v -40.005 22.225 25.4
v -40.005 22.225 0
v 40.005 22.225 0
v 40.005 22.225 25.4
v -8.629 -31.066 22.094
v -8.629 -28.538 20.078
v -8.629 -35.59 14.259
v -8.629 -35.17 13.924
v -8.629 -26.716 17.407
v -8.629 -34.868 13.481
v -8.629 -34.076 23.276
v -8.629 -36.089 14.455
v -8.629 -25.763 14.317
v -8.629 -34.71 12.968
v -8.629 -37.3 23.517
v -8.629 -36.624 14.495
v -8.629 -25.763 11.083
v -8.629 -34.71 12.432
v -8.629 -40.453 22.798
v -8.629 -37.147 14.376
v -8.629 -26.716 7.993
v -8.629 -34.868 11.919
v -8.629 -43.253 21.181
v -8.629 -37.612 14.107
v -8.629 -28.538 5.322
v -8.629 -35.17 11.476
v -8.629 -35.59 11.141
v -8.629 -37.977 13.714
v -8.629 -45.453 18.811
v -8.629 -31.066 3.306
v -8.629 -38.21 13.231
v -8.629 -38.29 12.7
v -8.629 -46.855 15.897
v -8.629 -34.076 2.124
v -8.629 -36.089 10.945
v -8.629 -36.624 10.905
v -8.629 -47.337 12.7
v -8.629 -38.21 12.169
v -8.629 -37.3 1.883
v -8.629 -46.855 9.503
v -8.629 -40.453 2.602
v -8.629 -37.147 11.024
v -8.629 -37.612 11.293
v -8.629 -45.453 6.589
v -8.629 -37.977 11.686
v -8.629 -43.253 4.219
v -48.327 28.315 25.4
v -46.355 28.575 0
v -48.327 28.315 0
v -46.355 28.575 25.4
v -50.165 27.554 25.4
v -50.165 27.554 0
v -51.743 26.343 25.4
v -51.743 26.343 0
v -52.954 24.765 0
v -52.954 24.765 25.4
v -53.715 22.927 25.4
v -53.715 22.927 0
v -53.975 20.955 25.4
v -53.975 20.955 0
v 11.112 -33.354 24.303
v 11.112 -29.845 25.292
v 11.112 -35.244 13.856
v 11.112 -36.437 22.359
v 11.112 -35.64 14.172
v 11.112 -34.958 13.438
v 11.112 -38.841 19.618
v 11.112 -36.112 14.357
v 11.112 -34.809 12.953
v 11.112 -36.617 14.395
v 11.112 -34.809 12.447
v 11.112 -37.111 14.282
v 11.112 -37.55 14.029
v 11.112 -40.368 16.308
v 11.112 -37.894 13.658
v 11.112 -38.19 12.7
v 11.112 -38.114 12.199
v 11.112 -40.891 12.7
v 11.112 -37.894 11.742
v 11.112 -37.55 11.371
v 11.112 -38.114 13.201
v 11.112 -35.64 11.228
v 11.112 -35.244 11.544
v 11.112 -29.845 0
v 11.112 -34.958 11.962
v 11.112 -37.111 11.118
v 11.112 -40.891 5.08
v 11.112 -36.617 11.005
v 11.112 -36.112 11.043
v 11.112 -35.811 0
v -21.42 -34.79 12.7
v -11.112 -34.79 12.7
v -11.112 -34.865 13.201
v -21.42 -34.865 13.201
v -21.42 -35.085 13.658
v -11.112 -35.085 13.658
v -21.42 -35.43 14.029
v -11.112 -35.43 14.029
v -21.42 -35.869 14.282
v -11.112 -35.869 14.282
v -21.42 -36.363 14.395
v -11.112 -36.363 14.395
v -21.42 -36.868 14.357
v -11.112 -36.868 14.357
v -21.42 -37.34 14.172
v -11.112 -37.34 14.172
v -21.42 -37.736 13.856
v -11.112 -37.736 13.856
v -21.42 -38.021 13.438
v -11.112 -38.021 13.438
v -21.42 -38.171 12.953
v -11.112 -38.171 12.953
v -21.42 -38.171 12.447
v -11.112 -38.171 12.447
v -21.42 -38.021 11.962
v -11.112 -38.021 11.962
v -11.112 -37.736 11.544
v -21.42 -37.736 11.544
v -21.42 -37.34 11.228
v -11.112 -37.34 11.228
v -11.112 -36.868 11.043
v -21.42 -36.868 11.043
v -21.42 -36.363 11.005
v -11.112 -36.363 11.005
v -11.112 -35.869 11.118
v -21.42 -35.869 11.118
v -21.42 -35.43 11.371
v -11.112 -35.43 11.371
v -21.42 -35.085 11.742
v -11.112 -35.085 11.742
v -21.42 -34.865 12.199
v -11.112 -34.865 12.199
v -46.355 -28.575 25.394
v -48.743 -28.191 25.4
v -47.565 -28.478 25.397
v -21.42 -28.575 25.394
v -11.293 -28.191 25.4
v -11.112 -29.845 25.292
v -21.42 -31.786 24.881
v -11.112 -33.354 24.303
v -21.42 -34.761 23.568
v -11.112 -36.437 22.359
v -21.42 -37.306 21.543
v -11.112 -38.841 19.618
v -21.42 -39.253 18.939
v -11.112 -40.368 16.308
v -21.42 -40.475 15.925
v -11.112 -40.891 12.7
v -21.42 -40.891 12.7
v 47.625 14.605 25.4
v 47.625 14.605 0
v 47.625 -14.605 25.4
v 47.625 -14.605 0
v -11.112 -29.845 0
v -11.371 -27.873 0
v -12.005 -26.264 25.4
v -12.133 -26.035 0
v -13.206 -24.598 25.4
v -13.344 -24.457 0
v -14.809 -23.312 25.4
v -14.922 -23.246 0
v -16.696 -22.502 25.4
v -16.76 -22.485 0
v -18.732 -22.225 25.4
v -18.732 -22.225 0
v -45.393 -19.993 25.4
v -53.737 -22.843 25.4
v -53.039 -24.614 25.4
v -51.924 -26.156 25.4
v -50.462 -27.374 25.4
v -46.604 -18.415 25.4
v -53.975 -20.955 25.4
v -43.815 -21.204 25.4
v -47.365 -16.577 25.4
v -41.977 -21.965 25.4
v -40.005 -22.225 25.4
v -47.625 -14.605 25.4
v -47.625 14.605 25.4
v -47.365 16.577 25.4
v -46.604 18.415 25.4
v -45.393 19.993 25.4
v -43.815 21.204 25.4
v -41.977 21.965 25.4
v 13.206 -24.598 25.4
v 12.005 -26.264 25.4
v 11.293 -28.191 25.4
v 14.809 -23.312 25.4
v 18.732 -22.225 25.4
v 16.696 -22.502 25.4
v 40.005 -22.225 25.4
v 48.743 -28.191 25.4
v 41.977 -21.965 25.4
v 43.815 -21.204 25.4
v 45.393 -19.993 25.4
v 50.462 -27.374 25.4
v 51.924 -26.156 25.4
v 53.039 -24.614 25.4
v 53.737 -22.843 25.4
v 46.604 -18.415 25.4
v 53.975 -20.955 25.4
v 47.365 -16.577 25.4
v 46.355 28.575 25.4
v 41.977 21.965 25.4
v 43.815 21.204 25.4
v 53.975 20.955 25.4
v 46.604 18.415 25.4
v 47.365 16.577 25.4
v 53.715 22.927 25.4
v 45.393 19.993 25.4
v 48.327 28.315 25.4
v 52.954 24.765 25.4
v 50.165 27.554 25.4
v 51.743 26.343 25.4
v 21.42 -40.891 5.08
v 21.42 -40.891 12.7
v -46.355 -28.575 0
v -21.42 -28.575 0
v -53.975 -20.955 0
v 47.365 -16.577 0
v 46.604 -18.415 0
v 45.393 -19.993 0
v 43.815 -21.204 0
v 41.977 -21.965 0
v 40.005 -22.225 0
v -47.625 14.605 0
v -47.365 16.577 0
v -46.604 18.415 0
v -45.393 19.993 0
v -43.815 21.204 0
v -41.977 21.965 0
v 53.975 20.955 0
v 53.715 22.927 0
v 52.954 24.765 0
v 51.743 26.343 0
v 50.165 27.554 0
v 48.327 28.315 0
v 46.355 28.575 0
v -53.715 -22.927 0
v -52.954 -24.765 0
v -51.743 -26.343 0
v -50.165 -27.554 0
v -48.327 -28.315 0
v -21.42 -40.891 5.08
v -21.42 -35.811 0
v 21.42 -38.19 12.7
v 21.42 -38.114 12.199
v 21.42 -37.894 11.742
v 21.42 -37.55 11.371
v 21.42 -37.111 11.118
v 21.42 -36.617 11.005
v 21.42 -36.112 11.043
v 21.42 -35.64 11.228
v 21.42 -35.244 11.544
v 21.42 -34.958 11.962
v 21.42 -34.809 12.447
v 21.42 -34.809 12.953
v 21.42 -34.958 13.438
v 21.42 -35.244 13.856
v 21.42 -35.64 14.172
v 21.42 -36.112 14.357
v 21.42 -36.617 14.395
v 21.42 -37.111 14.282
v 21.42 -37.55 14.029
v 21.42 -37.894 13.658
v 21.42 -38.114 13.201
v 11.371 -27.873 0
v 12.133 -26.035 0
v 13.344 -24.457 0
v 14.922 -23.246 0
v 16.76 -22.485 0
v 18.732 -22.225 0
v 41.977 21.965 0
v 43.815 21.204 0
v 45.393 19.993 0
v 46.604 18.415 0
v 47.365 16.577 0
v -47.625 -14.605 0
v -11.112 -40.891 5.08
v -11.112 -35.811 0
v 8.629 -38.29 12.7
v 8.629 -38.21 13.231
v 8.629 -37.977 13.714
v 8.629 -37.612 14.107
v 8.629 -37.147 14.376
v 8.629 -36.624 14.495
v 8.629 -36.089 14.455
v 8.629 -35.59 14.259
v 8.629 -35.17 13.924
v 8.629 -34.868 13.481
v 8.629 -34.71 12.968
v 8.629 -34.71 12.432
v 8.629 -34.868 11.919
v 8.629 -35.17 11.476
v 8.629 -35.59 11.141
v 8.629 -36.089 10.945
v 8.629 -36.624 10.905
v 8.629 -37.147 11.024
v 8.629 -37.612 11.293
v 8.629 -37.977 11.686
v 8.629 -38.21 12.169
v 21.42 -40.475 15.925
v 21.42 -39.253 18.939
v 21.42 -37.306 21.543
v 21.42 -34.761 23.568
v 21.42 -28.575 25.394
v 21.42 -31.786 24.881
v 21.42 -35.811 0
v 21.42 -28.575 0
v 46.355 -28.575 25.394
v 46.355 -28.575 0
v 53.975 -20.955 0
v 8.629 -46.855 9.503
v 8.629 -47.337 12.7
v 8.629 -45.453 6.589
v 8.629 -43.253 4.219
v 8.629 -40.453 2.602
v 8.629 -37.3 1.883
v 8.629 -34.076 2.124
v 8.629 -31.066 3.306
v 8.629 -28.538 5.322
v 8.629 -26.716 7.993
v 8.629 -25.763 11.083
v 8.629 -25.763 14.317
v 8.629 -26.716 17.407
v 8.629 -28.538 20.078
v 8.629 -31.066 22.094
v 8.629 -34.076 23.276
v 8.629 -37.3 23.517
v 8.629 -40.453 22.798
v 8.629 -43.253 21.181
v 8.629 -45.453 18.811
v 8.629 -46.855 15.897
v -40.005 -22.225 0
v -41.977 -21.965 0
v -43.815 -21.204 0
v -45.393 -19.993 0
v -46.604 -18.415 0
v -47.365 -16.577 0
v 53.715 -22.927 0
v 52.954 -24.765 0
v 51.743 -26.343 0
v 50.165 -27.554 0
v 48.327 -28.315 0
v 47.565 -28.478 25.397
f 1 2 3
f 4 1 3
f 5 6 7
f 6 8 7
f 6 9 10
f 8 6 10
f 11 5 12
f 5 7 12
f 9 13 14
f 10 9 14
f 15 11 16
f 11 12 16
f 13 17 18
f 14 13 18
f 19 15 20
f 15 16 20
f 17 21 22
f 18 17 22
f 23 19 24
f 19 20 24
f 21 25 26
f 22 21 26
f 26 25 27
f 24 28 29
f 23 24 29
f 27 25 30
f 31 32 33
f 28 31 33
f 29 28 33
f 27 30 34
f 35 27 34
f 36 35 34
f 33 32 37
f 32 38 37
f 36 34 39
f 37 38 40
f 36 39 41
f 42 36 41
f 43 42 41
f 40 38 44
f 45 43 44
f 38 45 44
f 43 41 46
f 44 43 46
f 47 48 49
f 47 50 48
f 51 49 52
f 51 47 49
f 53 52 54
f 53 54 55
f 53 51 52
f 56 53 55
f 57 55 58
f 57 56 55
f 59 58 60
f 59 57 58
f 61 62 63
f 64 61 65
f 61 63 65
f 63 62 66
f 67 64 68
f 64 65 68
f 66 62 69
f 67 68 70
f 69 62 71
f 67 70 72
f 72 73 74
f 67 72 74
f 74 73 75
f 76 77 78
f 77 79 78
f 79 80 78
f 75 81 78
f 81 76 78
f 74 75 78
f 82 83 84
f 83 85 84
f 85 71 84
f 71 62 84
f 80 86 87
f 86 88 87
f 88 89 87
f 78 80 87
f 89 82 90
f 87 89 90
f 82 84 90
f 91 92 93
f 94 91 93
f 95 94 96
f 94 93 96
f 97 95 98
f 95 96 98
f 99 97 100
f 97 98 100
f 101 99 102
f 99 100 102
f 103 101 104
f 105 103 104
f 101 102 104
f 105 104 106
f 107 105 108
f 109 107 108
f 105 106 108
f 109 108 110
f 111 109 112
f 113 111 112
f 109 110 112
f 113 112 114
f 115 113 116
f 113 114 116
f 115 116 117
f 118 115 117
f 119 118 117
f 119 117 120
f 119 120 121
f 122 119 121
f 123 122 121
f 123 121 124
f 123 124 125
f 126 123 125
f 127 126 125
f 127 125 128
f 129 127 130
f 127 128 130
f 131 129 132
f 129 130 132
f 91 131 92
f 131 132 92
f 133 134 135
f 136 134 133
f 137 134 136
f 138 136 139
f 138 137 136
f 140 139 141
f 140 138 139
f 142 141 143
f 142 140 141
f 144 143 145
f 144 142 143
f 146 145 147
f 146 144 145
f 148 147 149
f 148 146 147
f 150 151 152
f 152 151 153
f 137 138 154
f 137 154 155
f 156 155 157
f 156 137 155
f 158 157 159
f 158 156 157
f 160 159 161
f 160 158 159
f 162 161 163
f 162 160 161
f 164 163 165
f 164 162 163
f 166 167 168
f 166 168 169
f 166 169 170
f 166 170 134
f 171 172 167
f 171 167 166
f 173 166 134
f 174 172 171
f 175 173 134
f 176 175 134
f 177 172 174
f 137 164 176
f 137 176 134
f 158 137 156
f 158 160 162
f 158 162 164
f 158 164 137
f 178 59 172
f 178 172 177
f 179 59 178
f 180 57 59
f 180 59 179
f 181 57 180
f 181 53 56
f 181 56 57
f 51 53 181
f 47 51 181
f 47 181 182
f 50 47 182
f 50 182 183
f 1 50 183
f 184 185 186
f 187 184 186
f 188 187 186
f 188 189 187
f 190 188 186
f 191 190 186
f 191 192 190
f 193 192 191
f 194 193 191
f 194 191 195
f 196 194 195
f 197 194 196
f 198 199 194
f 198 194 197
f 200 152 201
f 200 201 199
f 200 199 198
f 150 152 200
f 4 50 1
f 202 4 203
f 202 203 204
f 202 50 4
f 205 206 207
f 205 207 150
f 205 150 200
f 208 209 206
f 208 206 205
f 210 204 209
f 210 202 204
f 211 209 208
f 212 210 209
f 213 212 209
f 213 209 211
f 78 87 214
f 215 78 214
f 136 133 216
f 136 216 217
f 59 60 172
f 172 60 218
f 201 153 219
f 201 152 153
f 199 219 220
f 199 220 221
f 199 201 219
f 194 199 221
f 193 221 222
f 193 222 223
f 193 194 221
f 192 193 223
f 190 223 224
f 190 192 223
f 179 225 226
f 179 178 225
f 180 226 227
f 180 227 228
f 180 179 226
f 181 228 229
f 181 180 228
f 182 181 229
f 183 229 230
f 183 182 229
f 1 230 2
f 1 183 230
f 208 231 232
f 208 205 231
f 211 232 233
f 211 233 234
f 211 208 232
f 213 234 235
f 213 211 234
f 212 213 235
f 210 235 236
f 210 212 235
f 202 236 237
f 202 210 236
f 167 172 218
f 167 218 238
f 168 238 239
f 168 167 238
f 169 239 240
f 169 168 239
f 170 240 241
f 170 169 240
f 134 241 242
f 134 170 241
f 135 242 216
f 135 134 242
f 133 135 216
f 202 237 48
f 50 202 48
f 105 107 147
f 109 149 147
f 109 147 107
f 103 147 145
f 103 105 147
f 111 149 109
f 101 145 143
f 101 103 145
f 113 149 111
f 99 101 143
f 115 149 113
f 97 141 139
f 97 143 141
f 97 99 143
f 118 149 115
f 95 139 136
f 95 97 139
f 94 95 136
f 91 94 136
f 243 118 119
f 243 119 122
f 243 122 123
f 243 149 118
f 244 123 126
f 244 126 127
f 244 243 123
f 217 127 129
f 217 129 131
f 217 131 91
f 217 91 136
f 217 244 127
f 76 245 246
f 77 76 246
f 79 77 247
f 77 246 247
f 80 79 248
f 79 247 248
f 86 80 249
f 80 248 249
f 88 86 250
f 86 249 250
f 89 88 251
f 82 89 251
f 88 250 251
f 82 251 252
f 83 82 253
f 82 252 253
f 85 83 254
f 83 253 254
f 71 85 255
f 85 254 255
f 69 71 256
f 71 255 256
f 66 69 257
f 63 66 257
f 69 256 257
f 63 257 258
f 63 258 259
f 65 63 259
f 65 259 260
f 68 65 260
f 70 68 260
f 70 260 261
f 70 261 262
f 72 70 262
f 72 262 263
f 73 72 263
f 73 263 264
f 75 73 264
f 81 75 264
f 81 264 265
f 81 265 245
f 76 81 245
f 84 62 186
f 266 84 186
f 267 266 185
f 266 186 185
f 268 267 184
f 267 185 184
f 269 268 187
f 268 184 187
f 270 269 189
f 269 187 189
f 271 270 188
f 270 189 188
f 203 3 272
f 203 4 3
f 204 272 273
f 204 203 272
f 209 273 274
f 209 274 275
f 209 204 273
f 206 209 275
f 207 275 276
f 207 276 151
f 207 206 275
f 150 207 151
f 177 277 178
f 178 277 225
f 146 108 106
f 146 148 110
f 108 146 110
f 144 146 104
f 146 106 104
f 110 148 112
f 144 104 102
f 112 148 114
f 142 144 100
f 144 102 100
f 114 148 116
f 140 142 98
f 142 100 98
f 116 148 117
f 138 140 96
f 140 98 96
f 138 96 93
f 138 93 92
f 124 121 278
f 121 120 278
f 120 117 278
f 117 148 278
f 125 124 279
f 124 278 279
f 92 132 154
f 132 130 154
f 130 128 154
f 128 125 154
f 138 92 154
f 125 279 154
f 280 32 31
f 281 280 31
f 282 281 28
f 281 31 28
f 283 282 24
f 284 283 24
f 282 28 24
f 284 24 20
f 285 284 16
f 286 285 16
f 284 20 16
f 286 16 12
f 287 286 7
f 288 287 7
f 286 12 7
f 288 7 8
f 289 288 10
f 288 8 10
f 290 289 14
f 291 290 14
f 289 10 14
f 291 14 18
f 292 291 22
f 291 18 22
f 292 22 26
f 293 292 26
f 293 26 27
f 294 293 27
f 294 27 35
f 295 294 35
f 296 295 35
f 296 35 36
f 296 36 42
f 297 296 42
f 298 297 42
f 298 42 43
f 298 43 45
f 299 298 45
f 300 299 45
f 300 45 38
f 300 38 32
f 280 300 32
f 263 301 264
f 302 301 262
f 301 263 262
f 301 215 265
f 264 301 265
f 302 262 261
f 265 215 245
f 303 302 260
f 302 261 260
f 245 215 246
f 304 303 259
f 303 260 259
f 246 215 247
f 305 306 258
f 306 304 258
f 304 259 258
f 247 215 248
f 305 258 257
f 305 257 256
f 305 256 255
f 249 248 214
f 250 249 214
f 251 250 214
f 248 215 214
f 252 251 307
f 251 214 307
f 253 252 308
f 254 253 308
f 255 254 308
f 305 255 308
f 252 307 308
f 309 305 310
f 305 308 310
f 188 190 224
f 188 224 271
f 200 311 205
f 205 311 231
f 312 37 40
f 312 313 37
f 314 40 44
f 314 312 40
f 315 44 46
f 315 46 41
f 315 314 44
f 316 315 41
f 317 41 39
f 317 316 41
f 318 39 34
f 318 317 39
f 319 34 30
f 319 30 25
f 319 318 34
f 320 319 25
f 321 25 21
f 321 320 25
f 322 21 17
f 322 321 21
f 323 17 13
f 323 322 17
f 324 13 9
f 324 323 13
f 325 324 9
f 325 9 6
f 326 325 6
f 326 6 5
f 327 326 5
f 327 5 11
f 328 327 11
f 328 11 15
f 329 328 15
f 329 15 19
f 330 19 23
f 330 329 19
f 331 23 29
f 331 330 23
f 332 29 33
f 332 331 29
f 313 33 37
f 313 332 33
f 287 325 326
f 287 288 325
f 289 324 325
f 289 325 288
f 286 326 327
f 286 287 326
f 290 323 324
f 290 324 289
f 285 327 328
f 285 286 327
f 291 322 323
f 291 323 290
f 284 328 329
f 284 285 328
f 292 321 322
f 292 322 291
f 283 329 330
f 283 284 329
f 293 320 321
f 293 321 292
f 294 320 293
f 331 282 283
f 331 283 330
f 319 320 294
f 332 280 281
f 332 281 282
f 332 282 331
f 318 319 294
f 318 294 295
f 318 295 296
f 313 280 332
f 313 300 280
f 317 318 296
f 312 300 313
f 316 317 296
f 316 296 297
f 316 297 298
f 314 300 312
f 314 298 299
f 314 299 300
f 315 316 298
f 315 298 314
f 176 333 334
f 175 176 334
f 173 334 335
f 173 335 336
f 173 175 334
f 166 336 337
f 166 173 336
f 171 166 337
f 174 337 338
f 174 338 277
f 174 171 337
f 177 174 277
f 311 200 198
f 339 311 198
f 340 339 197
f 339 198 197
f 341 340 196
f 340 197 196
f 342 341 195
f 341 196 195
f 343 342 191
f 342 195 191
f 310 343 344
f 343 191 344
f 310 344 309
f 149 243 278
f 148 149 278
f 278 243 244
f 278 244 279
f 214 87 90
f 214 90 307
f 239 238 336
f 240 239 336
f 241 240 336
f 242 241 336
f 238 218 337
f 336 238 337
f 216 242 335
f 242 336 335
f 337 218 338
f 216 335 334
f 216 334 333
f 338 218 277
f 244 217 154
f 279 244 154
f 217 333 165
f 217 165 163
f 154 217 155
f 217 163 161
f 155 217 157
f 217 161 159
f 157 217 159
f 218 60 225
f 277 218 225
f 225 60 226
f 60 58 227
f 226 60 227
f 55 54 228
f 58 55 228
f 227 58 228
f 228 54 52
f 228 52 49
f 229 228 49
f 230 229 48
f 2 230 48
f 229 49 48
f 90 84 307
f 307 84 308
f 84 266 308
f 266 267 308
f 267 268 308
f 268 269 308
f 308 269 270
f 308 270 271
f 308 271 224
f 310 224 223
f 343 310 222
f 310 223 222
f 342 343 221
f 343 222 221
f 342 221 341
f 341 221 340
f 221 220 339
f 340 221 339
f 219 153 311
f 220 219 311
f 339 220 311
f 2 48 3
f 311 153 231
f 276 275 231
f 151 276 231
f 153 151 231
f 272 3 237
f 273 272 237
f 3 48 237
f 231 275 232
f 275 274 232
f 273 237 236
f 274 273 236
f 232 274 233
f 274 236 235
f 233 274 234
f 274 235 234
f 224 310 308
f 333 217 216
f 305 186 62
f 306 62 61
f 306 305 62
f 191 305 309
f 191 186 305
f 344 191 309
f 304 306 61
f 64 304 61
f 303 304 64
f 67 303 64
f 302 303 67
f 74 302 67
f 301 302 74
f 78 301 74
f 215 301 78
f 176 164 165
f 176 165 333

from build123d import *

# Parameters (mm, degrees)
F0_W     = 10.3086968884
F0_H     = 12.3161332488
F1_DEPTH = 25.4
F0_W_2   = 17.2582492232
F0_H_2   = 10.8475995182
F5_D     = 3.6
F6_D     = 3.4
F6_DEPTH = 62.6051246116
F7_D     = 3.4
F8_R     = 12.7
F9_R     = 7.62
F10_SIZE = 5.08


with BuildPart() as f1:
    # F0 (on Top) → F1 (new body)
    with BuildSketch(Plane.XY):
        Polygon((21.42043598, -28.575), (53.975, -28.575), (53.975, 28.575), (-53.975, 28.575), (-53.975, -28.575), (-21.42043598, -28.575), (-11.1117390916, -28.575), (-11.1117390916, -22.225), (-47.625, -22.225), (-47.625, 22.225), (47.625, 22.225), (47.625, -22.225), (11.1117390916, -22.225), (11.1117390916, -28.575), align=None)
        with Locations((-16.2660875358, -34.7330666244)):
            Rectangle(F0_W, F0_H)
        with Locations((16.2660875358, -34.7330666244)):
            Rectangle(F0_W, F0_H)
    extrude(amount=F1_DEPTH)

    # F6 (through all, one way)
    with BuildSketch(Plane.YZ.offset(8.6291246116)):
        with Locations((-36.4898145199, 12.7)):
            Circle(F6_D / 2)
    extrude(amount=-F6_DEPTH, mode=Mode.SUBTRACT)

    # F7 (through all)
    with Locations(Plane(origin=(8.6291246116, 0, 0), x_dir=(0, 1, 0), z_dir=(-1, 0, 0))):
        with Locations((-36.4898145199, -12.7)):
            Hole(F7_D / 2)

    # F8
    f8_edges = [f1.edges().sort_by_distance(p)[0] for p in [
        (16.266088, -40.891133, 25.4),
        (-16.266088, -40.891133, 25.4),
    ]]
    fillet(f8_edges, radius=F8_R)

    # F9
    f9_edges = [f1.edges().sort_by_distance(p)[0] for p in [
        (-53.975, -28.575, 12.697099),
        (-53.975, 28.575, 12.7),
        (47.625, 22.225, 12.7),
        (53.975, 28.575, 12.7),
        (53.975, -28.575, 12.697099),
        (47.625, -22.225, 12.7),
        (-47.625, -22.225, 12.7),
        (-47.625, 22.225, 12.7),
        (-11.111739, -22.225, 12.7),
        (11.111739, -22.225, 12.7),
    ]]
    fillet(f9_edges, radius=F9_R)

    # F10
    f10_edges = [f1.edges().sort_by_distance(p)[0] for p in [
        (-16.266088, -40.891133, 0),
        (16.266088, -40.891133, 0),
    ]]
    chamfer(f10_edges, length=F10_SIZE)


with BuildPart() as f2:
    # F0 (on Top) → F2 (revolve)
    with BuildSketch(Plane.XY):
        with Locations((0, -41.913614279)):
            Rectangle(F0_W_2, F0_H_2)
    revolve(axis=Axis((0, -36.4898145199, 0), (1, 0, 0)))


with BuildPart() as f2_1:
    # F3: moved
    add(f2.part.moved(Location((0, 0, 12.7))))

    # F5 (through all)
    with Locations(Plane.YZ.offset(8.6291246116)):
        with Locations((-36.4898145199, 12.7)):
            Hole(F5_D / 2)


solid = Compound([f1.part, f2_1.part])
